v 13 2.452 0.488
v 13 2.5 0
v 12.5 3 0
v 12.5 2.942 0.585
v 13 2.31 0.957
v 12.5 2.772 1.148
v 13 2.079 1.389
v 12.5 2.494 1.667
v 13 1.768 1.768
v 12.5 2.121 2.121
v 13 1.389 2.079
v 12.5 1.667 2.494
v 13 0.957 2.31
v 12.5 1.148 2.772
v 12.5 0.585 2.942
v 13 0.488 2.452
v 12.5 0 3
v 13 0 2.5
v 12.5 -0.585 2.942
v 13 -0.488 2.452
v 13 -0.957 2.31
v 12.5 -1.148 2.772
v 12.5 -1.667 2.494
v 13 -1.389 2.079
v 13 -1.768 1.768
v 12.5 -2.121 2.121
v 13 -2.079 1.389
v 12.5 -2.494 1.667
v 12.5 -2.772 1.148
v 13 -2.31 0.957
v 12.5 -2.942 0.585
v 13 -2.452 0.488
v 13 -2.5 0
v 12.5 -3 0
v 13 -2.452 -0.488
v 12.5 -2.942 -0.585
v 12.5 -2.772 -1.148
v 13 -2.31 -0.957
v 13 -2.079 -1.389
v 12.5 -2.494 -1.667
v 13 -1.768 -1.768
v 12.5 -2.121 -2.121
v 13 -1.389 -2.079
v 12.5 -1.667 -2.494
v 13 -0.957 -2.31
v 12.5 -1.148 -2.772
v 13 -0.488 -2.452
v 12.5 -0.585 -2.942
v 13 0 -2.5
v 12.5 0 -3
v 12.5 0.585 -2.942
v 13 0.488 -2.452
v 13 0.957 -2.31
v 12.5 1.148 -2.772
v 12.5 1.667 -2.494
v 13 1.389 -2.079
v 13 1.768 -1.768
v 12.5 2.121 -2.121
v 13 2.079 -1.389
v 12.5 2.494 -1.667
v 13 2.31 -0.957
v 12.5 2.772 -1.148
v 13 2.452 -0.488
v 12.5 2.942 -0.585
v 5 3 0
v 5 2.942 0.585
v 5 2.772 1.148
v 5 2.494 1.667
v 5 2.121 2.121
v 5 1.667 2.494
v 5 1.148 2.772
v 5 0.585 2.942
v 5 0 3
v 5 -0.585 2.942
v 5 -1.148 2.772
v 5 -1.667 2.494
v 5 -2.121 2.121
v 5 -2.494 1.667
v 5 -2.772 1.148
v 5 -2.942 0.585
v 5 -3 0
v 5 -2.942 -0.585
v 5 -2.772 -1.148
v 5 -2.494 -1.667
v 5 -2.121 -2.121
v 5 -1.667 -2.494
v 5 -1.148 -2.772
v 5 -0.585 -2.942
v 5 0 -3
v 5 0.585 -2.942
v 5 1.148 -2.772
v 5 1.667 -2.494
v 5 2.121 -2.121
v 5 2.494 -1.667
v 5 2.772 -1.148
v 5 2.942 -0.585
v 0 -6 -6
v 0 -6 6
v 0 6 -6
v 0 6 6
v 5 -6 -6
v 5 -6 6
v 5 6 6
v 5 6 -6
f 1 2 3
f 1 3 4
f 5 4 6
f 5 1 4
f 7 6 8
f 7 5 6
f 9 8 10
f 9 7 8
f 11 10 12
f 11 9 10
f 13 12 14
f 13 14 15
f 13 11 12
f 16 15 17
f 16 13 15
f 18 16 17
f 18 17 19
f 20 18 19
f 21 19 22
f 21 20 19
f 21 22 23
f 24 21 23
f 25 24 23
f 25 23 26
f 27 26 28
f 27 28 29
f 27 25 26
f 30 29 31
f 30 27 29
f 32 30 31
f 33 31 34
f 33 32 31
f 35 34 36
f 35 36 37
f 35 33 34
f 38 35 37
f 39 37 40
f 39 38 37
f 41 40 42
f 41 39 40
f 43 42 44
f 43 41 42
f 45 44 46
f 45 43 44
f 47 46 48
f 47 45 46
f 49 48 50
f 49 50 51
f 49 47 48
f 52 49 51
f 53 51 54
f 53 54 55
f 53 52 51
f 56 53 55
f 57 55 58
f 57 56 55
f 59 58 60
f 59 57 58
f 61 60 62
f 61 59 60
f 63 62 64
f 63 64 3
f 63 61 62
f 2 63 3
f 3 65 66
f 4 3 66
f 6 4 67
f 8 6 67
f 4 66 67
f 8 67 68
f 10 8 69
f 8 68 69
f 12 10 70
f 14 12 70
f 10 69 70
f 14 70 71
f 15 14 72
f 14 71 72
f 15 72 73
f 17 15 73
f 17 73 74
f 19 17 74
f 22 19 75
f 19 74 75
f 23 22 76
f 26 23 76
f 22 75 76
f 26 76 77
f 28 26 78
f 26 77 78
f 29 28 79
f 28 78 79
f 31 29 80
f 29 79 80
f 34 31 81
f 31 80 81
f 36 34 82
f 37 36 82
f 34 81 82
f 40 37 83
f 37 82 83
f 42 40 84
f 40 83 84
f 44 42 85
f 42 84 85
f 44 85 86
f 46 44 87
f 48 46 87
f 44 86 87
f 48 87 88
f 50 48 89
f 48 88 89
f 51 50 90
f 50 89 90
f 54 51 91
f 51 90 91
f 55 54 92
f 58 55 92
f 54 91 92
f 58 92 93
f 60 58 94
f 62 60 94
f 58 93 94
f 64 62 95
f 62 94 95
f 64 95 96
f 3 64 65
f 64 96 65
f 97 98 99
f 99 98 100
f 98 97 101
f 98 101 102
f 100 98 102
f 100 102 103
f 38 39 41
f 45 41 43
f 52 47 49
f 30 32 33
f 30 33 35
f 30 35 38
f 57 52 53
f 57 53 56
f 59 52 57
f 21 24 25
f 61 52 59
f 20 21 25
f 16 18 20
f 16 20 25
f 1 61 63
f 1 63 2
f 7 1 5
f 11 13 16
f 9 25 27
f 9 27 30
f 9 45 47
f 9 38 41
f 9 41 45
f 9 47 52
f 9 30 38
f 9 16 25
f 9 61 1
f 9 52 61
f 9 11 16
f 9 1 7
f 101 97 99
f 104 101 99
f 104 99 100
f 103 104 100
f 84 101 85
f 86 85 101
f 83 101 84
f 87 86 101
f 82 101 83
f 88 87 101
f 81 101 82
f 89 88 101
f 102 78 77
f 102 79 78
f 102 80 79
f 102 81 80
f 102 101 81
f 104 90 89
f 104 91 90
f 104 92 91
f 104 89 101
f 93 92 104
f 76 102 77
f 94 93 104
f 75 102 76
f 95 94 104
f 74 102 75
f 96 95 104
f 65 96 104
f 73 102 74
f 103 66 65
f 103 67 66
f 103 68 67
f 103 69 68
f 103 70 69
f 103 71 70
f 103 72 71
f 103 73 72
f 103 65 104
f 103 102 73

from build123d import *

# Parameters (mm, degrees)
F0_W     = 12
F0_H     = 12
F1_DEPTH = 5
F2_R     = 3
F3_DEPTH = 8
F4_SIZE  = 0.5


with BuildPart() as f1:
    # F0 (on Right) → F1 (new body)
    with BuildSketch(Plane.YZ):
        Rectangle(F0_W, F0_H)
    extrude(amount=F1_DEPTH)

    # F2 (on face) → F3 (join)
    with BuildSketch(Plane.YZ.offset(5)):
        Circle(F2_R)
    extrude(amount=F3_DEPTH)

    # F4
    f4_edges = [f1.edges().sort_by_distance(p)[0] for p in [
        (13, -3, 0),
    ]]
    chamfer(f4_edges, length=F4_SIZE)


solid = f1.part
